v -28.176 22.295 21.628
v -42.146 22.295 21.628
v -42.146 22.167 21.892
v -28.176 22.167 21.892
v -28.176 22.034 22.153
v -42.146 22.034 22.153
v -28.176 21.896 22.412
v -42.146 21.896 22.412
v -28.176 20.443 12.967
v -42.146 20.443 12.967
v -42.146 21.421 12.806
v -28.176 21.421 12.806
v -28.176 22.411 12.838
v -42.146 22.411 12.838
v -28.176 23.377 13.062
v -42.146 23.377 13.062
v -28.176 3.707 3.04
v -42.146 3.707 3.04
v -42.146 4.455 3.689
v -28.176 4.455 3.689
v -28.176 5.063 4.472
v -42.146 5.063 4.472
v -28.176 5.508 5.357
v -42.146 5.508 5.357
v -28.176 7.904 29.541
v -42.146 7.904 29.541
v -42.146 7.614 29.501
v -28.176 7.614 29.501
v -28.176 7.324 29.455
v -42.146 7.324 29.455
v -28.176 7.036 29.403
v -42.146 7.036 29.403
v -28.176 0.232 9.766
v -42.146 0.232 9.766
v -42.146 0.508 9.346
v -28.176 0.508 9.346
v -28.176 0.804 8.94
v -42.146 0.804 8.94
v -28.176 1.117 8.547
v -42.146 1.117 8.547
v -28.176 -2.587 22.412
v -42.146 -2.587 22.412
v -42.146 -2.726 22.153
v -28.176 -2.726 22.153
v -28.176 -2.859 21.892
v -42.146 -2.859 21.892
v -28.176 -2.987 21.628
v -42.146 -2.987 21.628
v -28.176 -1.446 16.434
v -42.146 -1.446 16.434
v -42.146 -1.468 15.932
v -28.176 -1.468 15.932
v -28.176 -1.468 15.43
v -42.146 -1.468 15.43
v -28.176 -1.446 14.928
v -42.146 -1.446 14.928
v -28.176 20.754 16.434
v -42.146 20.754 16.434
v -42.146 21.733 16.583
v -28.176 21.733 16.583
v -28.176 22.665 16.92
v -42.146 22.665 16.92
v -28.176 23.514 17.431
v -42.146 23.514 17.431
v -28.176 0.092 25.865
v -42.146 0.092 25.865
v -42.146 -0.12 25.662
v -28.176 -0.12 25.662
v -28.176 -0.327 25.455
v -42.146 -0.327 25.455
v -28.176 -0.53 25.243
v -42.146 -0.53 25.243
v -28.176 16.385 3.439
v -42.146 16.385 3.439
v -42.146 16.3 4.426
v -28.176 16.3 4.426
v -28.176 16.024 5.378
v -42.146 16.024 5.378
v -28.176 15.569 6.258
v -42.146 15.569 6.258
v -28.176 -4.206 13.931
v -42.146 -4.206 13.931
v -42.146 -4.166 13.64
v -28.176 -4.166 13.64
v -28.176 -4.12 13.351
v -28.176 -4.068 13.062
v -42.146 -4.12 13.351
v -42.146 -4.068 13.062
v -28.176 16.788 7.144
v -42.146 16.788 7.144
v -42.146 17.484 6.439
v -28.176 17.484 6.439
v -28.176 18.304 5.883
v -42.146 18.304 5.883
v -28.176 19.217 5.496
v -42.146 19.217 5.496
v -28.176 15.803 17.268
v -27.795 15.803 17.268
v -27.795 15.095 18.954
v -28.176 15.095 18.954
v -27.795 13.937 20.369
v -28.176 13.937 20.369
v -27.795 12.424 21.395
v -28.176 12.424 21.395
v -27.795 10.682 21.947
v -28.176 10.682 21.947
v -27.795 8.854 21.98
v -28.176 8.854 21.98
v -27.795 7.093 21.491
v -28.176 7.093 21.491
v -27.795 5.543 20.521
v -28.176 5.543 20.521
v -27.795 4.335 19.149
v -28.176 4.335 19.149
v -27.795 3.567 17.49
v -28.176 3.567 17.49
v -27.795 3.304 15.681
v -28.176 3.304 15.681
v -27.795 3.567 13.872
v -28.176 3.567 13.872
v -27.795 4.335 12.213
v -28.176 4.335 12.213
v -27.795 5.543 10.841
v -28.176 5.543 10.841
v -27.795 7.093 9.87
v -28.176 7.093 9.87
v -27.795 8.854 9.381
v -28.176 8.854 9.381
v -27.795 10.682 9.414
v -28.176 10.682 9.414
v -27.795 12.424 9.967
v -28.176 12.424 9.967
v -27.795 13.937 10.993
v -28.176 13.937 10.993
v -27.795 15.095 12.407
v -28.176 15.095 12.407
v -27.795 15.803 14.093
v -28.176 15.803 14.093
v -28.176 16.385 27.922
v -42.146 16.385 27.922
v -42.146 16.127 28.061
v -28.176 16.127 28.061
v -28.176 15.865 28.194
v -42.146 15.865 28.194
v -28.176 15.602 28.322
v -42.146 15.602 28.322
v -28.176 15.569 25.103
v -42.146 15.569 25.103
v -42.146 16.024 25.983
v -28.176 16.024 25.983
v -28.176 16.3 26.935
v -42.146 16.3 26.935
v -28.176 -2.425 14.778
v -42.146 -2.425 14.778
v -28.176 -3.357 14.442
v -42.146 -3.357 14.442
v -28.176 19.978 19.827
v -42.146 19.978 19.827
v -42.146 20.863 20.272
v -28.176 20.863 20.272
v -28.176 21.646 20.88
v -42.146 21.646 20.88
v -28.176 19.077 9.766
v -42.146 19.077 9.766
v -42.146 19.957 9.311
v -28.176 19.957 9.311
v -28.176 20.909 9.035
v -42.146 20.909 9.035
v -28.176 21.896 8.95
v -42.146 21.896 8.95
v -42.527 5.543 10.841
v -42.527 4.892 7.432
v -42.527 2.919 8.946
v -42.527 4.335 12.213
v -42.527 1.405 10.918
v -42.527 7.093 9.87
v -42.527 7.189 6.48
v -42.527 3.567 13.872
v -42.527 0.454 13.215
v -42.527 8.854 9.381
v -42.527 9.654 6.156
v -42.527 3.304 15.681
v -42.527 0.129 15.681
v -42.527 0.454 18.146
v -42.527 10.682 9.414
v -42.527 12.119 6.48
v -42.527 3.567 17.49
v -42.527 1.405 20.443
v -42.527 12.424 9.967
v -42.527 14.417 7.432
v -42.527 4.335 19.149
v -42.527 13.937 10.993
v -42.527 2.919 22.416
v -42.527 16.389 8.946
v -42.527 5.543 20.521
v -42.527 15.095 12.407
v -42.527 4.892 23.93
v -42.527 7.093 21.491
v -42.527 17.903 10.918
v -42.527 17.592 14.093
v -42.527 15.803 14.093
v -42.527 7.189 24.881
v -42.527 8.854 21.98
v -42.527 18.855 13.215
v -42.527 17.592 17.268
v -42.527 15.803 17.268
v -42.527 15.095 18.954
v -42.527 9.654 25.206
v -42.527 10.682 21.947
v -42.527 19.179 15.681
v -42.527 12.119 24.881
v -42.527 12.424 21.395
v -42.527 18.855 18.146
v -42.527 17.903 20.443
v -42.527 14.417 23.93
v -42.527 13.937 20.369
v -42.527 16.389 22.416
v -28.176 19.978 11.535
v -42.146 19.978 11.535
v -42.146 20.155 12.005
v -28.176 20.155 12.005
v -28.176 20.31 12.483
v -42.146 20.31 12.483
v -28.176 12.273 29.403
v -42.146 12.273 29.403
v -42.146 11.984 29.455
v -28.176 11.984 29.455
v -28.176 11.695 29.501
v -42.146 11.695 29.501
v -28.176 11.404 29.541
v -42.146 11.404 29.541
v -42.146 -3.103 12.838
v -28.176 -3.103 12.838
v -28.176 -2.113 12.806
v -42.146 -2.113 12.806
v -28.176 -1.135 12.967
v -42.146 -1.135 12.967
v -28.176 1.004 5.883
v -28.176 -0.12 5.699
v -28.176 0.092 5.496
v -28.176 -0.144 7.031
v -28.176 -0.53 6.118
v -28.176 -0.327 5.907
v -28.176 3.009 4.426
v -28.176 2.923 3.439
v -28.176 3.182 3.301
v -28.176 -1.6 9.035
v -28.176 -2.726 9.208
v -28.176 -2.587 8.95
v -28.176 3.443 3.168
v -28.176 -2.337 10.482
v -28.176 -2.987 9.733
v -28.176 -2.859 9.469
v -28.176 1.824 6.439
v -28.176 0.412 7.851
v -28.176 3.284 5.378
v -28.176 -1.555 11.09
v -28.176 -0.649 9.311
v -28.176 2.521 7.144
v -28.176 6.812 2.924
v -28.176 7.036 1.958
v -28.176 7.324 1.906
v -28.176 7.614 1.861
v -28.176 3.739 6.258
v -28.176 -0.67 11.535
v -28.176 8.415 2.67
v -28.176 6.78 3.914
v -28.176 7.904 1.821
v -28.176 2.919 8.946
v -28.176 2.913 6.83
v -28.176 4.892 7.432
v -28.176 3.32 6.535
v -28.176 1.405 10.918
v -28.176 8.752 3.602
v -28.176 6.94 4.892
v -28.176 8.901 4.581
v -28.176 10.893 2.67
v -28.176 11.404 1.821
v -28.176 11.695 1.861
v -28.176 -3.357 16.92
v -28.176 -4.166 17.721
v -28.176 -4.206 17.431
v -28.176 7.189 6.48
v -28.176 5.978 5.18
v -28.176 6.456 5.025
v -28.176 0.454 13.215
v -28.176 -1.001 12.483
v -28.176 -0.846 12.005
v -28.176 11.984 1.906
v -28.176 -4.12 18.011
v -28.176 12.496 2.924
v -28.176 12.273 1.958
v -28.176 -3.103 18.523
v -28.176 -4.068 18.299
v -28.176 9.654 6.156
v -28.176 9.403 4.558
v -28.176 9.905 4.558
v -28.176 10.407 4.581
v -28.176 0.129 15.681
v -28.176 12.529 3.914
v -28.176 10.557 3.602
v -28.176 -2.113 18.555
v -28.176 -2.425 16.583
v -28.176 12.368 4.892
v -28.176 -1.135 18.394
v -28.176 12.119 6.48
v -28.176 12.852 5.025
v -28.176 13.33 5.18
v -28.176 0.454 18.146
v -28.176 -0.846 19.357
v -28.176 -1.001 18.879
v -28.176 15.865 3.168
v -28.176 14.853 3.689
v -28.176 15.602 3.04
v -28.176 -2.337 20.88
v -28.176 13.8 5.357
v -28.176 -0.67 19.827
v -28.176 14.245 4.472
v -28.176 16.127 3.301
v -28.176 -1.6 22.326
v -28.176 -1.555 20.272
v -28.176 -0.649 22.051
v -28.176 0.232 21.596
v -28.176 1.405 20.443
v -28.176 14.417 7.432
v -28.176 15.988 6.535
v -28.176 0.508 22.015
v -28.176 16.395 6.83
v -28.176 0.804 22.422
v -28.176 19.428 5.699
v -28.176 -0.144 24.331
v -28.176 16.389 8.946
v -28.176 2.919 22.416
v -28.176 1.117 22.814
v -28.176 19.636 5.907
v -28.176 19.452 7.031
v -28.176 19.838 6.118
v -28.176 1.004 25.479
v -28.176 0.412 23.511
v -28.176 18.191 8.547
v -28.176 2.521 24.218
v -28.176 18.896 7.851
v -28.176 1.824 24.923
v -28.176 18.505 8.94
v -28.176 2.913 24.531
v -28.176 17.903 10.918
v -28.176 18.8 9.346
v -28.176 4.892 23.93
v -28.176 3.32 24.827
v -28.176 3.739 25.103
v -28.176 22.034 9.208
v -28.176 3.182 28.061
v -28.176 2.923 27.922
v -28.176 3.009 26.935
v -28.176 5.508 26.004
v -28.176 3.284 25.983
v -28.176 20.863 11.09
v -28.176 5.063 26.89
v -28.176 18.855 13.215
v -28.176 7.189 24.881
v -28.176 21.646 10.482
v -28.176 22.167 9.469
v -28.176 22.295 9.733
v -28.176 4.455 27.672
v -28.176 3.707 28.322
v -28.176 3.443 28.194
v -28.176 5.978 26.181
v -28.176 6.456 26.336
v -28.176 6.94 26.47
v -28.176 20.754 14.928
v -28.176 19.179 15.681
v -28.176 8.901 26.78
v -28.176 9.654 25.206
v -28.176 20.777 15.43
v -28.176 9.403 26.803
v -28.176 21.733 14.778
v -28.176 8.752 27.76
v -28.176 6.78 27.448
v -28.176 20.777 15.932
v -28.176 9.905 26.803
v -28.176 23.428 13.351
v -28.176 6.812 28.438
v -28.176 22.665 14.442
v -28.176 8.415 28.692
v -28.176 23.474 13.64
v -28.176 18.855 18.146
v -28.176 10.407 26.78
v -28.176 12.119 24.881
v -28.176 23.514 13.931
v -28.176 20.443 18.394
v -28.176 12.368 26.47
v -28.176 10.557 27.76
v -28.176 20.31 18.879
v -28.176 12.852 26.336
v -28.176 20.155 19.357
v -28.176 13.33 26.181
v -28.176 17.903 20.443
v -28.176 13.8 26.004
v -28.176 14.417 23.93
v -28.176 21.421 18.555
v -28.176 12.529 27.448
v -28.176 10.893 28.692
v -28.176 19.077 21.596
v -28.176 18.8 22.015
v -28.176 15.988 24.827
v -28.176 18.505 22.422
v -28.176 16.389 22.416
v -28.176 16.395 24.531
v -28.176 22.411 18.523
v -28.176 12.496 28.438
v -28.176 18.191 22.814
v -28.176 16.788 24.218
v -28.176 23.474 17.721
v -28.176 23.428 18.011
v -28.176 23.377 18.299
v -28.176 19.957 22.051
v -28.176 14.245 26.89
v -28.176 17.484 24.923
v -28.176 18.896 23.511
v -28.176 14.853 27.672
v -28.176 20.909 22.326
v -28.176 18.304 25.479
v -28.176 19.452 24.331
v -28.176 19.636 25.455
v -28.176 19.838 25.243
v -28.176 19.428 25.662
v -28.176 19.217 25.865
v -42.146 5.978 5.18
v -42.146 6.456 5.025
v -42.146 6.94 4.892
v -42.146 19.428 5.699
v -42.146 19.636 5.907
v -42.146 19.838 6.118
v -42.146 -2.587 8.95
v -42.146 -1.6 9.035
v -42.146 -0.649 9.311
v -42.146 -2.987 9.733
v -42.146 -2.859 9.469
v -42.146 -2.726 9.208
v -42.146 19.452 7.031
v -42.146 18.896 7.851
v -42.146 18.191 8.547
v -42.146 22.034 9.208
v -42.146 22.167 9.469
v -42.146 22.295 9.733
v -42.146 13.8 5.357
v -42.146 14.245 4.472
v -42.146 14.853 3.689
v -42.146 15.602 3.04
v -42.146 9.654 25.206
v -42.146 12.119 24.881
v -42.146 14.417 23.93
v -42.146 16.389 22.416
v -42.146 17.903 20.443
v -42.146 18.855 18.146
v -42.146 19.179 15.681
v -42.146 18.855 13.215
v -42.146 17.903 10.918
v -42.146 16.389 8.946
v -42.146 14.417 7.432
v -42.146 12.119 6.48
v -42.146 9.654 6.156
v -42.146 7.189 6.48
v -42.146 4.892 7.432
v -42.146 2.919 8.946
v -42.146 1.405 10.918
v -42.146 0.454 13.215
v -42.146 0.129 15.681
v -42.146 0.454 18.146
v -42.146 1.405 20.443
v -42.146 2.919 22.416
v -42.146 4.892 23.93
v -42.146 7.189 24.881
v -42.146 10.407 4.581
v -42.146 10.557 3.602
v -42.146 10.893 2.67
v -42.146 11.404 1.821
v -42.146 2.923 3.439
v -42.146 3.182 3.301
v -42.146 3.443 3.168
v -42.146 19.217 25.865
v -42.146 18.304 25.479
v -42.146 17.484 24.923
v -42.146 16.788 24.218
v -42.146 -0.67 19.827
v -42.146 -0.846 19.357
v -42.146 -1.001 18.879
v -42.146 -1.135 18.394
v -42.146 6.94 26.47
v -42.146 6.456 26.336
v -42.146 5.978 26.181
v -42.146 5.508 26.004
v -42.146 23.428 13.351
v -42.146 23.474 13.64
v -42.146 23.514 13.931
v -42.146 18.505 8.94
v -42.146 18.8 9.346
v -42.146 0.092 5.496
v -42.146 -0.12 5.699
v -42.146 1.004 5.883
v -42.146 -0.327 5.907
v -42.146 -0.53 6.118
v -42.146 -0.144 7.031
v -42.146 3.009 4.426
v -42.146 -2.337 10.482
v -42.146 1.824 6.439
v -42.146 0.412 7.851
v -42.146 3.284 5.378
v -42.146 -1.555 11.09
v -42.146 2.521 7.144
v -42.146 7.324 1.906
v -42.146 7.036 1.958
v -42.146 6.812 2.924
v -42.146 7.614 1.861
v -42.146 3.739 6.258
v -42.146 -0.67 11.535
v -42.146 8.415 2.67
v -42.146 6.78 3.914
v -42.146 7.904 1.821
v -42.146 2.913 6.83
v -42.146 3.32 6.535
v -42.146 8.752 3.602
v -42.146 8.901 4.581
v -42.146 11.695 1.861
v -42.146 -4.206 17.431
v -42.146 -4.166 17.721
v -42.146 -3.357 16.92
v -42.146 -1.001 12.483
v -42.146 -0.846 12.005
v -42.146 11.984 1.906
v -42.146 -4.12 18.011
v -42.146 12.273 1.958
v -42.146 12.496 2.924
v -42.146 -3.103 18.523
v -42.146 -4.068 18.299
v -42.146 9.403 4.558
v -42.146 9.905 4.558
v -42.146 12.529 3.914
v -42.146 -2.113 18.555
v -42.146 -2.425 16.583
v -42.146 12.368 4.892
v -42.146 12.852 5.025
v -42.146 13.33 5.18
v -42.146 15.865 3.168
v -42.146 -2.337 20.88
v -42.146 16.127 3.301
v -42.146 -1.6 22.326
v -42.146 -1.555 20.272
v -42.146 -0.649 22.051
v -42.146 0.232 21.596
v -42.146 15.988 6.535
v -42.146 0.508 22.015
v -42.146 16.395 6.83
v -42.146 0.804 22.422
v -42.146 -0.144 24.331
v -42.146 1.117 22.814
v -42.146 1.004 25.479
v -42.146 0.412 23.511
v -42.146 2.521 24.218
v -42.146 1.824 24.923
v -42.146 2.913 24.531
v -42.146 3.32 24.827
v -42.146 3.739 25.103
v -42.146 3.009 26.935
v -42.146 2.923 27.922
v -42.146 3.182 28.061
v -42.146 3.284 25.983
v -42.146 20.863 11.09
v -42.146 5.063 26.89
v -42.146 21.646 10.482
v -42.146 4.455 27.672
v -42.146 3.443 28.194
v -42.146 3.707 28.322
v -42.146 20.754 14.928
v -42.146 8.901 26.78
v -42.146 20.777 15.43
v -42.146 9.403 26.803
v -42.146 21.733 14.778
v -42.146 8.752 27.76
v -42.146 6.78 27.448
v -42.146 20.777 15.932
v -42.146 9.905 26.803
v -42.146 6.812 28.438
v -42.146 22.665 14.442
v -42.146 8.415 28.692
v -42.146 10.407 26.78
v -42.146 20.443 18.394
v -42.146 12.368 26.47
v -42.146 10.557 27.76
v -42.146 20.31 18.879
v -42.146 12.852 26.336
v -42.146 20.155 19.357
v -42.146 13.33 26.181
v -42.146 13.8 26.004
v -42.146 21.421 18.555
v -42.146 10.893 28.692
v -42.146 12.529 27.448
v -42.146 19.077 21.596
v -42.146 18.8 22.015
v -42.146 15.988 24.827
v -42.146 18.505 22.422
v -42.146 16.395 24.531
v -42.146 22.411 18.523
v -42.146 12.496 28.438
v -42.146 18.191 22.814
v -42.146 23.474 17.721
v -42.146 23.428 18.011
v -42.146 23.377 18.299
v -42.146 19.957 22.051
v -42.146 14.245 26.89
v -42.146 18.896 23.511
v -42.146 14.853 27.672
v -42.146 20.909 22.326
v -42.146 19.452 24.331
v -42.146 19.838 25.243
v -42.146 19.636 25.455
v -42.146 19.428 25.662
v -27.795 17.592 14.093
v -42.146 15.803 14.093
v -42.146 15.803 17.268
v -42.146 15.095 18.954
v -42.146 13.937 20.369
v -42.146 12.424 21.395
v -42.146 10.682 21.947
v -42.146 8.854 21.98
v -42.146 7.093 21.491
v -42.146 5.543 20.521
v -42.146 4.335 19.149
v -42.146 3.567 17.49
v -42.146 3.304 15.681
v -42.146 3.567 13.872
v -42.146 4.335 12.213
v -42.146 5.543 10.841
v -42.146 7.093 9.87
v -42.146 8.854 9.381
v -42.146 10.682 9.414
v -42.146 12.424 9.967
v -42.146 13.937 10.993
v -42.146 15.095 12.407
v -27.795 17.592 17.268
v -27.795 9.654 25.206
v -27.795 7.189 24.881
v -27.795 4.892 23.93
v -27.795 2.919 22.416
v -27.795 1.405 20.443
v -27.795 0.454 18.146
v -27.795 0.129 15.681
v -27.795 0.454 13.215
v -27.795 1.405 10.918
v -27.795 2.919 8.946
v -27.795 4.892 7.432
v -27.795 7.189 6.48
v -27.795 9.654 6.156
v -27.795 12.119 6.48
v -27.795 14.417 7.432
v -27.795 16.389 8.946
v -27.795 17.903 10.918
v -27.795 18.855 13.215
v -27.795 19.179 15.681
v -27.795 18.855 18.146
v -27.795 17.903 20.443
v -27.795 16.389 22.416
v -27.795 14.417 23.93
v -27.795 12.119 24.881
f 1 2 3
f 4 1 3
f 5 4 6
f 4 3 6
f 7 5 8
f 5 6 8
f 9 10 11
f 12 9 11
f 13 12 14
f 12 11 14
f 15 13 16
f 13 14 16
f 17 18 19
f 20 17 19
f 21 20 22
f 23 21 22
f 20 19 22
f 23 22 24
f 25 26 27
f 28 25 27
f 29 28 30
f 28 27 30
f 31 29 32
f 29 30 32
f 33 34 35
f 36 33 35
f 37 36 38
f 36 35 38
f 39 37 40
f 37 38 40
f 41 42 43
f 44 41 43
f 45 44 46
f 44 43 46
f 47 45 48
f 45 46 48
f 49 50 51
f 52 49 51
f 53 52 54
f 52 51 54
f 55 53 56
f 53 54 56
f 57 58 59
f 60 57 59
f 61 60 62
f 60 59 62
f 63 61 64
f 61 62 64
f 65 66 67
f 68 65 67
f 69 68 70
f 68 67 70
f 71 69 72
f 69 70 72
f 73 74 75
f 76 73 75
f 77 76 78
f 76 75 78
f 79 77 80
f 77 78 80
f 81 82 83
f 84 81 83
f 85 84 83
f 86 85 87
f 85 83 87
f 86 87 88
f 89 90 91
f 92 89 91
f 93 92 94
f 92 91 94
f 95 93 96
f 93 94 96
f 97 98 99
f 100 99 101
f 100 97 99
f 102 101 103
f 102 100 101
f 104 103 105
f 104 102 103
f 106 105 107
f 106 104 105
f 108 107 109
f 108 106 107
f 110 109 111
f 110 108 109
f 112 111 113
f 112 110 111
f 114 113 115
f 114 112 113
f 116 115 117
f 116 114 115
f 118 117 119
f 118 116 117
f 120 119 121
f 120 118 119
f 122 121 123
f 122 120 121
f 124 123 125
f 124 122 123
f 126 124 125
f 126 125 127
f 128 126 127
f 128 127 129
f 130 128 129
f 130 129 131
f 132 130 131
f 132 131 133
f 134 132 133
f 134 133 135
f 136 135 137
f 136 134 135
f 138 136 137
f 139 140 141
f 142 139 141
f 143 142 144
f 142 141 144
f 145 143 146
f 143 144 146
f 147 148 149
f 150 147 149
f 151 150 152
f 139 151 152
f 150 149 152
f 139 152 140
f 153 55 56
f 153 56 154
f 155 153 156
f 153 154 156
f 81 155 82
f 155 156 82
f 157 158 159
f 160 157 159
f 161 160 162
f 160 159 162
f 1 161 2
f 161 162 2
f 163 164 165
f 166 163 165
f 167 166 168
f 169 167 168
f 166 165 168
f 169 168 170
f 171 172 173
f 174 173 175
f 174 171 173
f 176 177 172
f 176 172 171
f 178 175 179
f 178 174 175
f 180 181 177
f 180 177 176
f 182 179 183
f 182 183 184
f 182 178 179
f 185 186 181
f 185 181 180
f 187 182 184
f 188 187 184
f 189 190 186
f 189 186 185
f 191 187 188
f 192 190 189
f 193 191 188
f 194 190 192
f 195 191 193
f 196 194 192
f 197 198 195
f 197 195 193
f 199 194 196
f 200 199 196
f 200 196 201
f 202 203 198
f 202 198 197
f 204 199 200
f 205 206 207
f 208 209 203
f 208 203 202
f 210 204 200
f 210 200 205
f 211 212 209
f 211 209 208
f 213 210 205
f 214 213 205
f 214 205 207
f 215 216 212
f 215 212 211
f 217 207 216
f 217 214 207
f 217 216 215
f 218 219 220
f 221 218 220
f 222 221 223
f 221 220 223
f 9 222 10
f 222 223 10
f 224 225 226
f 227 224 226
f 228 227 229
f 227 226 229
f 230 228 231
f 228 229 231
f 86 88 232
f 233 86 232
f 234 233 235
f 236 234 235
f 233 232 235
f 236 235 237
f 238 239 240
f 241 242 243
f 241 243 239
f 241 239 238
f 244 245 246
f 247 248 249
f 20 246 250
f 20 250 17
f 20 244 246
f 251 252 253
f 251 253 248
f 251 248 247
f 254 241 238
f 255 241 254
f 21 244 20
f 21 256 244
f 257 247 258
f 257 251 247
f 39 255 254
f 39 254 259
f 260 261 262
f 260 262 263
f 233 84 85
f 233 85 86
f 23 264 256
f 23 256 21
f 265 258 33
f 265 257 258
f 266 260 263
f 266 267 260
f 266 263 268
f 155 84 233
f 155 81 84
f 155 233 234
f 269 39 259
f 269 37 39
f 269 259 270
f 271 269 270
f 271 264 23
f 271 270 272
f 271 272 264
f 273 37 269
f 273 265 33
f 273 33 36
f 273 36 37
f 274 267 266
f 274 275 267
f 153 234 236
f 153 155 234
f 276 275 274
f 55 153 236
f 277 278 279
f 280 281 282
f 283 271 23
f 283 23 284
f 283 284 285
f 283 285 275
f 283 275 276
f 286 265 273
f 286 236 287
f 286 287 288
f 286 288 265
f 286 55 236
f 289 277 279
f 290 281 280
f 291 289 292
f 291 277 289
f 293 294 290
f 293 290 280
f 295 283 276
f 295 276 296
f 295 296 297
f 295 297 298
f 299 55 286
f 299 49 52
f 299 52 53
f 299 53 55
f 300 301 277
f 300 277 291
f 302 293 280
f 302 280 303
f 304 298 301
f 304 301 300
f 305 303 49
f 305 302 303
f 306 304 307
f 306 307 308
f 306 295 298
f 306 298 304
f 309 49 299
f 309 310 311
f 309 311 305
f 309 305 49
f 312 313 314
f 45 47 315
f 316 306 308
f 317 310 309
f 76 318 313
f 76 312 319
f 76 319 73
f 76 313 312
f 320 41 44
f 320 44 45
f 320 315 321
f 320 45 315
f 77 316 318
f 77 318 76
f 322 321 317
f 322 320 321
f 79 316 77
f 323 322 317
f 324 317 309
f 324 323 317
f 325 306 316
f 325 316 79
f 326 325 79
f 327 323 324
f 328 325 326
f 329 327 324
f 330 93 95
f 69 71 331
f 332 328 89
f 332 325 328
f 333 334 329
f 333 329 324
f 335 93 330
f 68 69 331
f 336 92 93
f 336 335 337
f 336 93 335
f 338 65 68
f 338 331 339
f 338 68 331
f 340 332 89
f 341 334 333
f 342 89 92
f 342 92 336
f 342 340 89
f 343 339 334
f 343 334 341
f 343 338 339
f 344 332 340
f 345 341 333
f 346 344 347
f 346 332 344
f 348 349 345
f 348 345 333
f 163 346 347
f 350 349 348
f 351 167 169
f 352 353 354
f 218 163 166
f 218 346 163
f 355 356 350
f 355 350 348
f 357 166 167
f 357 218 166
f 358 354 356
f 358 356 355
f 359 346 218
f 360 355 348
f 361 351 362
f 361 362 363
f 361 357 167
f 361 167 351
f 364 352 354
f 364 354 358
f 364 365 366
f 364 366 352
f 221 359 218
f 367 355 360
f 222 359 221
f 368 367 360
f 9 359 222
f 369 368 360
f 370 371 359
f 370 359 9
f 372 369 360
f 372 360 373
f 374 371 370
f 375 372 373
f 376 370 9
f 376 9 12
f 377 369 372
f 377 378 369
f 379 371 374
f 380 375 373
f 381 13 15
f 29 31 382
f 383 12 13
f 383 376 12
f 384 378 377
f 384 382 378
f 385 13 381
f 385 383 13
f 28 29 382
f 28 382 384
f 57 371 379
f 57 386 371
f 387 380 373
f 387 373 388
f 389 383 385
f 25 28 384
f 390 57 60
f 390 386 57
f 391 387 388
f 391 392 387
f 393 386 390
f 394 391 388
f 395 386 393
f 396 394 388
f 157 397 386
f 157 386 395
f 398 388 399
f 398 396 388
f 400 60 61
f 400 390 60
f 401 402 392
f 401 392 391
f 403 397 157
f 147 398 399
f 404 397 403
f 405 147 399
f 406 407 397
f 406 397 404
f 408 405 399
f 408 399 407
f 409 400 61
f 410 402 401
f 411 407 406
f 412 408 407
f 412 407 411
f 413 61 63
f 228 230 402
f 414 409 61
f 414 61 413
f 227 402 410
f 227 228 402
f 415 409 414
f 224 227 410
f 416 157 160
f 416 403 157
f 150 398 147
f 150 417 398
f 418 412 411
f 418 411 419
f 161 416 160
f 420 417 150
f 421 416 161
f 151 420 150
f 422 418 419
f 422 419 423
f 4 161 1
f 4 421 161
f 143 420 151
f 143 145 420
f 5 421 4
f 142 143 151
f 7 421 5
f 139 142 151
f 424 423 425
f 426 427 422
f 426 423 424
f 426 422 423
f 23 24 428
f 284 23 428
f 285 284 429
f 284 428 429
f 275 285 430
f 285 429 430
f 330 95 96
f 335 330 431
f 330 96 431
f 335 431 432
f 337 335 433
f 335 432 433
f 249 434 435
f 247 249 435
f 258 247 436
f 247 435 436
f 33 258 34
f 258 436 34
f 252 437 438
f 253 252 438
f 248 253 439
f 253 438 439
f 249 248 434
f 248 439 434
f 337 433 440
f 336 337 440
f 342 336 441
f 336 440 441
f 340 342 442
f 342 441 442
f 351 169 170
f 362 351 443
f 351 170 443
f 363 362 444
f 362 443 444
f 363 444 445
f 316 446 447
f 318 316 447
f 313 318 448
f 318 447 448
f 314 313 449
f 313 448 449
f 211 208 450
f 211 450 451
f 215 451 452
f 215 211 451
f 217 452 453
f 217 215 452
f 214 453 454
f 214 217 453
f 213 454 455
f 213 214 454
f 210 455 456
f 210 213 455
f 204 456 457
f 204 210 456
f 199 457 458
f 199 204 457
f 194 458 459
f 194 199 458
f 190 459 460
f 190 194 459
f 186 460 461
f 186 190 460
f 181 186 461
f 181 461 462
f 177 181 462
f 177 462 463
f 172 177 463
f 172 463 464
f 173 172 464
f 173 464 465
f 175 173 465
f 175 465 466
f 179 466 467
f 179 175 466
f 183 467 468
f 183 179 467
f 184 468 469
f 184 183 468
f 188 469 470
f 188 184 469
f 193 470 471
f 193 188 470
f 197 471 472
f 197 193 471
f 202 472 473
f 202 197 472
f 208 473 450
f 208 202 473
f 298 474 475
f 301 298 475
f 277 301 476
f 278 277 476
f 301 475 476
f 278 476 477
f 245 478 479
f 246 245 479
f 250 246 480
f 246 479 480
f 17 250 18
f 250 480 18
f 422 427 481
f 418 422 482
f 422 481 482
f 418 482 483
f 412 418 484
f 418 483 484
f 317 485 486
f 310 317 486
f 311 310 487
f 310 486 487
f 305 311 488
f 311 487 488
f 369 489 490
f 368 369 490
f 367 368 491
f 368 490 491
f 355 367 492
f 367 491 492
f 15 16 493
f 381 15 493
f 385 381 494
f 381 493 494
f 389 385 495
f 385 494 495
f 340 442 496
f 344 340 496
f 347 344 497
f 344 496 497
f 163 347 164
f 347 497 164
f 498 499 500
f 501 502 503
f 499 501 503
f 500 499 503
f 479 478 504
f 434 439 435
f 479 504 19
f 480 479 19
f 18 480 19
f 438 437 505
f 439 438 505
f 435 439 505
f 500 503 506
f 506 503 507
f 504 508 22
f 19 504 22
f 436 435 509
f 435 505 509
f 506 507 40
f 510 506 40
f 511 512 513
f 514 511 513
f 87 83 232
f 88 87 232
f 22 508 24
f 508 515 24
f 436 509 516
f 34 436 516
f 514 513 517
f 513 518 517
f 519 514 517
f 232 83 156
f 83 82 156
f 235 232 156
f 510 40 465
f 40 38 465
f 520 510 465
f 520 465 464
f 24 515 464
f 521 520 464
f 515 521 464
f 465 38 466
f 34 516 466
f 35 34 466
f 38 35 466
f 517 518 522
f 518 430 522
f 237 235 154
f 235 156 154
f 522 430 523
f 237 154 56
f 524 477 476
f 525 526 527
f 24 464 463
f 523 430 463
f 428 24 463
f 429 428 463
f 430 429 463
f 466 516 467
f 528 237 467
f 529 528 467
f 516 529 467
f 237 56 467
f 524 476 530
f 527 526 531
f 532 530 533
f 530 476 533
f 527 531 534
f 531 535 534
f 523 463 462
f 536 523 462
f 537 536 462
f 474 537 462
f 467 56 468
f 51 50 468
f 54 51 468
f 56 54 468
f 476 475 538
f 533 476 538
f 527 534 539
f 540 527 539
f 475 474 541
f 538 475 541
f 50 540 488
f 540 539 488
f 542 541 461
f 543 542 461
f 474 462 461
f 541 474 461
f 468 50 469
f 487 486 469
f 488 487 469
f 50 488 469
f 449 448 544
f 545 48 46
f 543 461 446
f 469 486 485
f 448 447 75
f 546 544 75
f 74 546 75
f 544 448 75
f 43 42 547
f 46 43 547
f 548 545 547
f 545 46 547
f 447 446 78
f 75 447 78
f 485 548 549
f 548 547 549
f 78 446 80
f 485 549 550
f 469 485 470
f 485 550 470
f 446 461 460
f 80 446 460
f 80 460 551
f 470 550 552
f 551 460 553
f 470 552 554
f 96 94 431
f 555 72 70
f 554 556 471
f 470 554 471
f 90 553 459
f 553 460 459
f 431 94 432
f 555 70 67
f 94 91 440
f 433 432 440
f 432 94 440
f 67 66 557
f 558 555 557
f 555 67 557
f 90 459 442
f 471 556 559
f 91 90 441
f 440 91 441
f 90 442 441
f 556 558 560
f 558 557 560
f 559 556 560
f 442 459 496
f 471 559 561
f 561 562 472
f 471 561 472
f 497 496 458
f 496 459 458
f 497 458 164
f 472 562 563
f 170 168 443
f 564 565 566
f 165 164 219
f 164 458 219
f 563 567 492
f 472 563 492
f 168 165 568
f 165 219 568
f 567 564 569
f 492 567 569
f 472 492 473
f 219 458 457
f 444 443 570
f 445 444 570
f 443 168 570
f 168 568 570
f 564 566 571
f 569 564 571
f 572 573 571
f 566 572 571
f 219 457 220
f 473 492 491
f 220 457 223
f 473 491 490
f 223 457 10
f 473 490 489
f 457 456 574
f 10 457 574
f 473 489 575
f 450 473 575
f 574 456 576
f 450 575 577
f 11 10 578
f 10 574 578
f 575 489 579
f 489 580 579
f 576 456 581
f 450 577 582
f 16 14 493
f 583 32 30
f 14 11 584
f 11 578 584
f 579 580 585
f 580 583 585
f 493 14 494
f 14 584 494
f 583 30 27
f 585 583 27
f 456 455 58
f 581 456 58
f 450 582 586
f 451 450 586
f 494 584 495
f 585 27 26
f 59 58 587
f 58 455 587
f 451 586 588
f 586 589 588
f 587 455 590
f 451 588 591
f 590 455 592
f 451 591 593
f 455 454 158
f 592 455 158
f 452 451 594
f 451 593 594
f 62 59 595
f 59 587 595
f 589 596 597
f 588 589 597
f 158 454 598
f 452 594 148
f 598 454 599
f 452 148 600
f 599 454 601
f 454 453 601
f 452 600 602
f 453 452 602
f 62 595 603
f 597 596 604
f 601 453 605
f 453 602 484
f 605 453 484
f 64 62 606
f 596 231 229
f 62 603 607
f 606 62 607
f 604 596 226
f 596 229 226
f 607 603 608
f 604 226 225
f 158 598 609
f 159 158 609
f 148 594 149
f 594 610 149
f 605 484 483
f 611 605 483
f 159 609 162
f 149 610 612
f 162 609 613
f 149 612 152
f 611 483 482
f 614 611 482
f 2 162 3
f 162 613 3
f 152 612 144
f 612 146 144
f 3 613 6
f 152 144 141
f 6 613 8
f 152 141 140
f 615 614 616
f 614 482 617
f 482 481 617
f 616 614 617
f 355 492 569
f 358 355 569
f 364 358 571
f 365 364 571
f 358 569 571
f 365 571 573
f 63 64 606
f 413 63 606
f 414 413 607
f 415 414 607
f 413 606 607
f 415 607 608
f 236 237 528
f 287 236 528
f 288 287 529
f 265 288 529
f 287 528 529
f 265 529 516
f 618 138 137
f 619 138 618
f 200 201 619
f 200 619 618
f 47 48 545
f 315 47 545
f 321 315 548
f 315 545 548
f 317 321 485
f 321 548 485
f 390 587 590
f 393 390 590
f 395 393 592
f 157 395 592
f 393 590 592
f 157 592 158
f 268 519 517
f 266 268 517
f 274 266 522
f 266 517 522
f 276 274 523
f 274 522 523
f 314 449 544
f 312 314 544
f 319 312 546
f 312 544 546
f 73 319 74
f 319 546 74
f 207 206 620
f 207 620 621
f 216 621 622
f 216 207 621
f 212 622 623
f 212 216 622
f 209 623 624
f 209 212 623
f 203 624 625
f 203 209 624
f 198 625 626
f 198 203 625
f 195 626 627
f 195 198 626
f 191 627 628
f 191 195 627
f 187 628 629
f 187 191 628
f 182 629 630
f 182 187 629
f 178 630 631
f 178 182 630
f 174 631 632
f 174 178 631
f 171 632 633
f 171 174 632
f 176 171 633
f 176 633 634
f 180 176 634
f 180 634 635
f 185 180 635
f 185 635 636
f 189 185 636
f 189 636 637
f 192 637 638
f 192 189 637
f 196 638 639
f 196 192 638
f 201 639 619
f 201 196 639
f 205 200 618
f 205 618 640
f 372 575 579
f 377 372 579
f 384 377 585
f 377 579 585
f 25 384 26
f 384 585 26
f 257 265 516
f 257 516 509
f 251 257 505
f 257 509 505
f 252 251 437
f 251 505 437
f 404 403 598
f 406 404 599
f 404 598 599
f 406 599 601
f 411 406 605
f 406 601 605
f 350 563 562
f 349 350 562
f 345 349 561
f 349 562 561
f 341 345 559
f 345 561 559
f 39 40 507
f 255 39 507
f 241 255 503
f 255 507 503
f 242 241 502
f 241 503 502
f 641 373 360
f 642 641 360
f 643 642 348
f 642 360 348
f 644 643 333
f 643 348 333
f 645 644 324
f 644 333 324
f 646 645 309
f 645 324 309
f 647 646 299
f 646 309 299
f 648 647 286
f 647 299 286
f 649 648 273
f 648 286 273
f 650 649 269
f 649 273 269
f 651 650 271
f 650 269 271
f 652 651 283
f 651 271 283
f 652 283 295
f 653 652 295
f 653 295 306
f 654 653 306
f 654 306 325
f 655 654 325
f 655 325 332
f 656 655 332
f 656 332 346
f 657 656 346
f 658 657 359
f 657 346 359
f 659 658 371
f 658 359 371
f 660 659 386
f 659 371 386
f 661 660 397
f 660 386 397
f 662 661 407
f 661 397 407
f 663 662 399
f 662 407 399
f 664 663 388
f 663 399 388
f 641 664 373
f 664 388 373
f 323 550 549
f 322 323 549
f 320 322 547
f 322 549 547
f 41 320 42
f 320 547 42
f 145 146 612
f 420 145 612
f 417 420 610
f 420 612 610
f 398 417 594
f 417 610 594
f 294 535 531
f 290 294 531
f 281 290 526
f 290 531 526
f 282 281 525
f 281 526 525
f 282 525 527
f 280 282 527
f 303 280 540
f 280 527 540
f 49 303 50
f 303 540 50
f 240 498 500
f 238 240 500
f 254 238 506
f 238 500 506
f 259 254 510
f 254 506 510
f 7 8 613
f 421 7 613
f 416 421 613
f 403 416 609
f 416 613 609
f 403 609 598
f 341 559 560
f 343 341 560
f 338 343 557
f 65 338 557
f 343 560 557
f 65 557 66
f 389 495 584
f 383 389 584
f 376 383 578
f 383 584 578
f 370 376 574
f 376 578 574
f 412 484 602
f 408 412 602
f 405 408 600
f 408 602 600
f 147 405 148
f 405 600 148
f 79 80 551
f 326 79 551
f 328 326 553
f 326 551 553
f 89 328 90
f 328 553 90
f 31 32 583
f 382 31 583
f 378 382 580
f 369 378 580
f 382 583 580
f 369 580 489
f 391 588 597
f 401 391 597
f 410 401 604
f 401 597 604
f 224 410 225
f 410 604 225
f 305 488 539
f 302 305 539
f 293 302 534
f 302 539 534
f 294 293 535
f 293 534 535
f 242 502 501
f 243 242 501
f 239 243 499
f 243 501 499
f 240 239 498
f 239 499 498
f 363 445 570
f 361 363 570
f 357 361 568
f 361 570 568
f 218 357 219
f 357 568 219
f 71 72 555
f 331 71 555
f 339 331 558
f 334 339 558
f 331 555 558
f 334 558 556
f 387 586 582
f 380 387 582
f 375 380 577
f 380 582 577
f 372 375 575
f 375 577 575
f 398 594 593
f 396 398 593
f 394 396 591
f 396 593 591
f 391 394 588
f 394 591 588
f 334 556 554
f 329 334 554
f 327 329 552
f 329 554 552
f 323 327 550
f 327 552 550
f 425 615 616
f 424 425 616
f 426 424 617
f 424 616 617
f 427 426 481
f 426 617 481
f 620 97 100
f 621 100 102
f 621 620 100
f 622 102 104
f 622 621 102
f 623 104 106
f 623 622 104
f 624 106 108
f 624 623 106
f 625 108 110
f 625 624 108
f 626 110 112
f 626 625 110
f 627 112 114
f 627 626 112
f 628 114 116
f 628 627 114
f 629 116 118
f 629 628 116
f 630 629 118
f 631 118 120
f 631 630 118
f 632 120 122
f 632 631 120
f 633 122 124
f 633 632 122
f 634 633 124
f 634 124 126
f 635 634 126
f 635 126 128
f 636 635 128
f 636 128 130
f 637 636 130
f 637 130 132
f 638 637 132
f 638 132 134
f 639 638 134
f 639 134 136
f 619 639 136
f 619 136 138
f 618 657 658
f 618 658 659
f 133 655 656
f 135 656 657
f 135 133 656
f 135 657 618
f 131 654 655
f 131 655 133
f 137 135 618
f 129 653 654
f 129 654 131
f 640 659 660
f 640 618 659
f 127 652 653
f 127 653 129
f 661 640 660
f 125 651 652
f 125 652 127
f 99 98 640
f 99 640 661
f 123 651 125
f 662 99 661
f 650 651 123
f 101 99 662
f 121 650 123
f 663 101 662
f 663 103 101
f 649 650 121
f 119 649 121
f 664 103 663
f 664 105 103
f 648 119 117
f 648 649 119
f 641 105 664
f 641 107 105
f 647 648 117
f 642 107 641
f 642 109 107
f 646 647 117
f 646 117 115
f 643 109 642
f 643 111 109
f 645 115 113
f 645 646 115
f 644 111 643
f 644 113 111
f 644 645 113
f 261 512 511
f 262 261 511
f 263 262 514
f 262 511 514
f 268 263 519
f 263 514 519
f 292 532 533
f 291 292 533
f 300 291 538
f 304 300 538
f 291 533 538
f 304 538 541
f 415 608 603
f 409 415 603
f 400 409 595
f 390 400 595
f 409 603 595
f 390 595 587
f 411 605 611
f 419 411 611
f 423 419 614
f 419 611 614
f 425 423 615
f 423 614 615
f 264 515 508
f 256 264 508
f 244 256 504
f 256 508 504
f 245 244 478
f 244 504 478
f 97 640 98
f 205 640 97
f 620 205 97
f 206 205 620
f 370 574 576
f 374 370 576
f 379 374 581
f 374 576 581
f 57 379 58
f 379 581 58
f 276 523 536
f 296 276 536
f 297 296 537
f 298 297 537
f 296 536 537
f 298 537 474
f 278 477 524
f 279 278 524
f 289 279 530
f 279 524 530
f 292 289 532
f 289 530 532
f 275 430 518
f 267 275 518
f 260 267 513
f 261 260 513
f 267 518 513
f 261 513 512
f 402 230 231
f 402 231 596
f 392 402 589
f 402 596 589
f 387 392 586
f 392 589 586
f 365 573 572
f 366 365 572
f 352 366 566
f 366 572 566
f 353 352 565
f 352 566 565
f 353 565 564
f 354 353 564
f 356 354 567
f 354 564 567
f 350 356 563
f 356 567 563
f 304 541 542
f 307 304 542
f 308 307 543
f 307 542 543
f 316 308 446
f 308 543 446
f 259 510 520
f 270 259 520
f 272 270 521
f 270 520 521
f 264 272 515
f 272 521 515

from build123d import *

# Parameters (mm, degrees)
SPUR_START             = -42.145535126
SPUR_GEAR_AI_OUTLINE_R = 6.35
SPUR_GEAR_AI_DEPTH     = 13.97
SKETCH1_W              = 3.175
SKETCH1_H              = 3.175
CUT_EXTRUDE1_DEPTH     = 41.258239372
SKETCH2_R              = 9.525
BOSS_EXTRUDE1_DEPTH    = 0.381
BOSS_EXTRUDE2_START    = 0.381
SKETCH3_R              = 9.525
BOSS_EXTRUDE2_DEPTH    = 0.381


# Read off the part's stored shape, not the designer's step: spur gear_ai
with BuildPart() as part:
    # spur gear_ai outline → spur gear_ai (new body)
    with BuildSketch(Plane.YZ.offset(SPUR_START)):
        with BuildLine():
            ThreePointArc((21.89573329, 8.949900066), (22.10150024, 9.338497576), (22.294935451, 9.733378421))
            ThreePointArc((22.294935451, 9.733378421), (21.269289936, 10.804918767), (19.977842952, 11.534516))
            ThreePointArc((19.977842952, 11.534516), (20.234833052, 12.242868992), (20.443283136, 12.966993591))
            ThreePointArc((20.443283136, 12.966993591), (21.916932187, 12.79815666), (23.376532451, 13.062191702))
            ThreePointArc((23.376532451, 13.062191702), (23.452145215, 13.495355381), (23.514088141, 13.93068415))
            ThreePointArc((23.514088141, 13.93068415), (22.207517114, 14.632837684), (20.7538201, 14.927646821))
            ThreePointArc((20.7538201, 14.927646821), (20.779339097, 15.680744858), (20.7538201, 16.433842895))
            ThreePointArc((20.7538201, 16.433842895), (22.207517114, 16.728652032), (23.514088141, 17.430805566))
            ThreePointArc((23.514088141, 17.430805566), (23.452145215, 17.866134334), (23.376532451, 18.299298013))
            ThreePointArc((23.376532451, 18.299298013), (21.916932187, 18.563333056), (20.443283136, 18.394496125))
            ThreePointArc((20.443283136, 18.394496125), (20.234833052, 19.118620724), (19.977842952, 19.826973715))
            ThreePointArc((19.977842952, 19.826973715), (21.269289936, 20.556570948), (22.294935451, 21.628111294))
            ThreePointArc((22.294935451, 21.628111294), (22.10150024, 22.022992139), (21.89573329, 22.41158965))
            ThreePointArc((21.89573329, 22.41158965), (20.425979632, 22.21166061), (19.07662958, 21.595704547))
            ThreePointArc((19.07662958, 21.595704547), (18.654614962, 22.219973346), (18.191309741, 22.814242767))
            ThreePointArc((18.191309741, 22.814242767), (19.194090867, 23.907210035), (19.83841354, 25.243247358))
            ThreePointArc((19.83841354, 25.243247358), (19.53242083, 25.559026591), (19.216641597, 25.865019301))
            ThreePointArc((19.216641597, 25.865019301), (17.880604274, 25.220696628), (16.787637006, 24.217915502))
            ThreePointArc((16.787637006, 24.217915502), (16.193367585, 24.681220723), (15.569098786, 25.103235341))
            ThreePointArc((15.569098786, 25.103235341), (16.185054849, 26.452585393), (16.384983889, 27.922339051))
            ThreePointArc((16.384983889, 27.922339051), (15.996386378, 28.128106001), (15.601505533, 28.321541212))
            ThreePointArc((15.601505533, 28.321541212), (14.529965187, 27.295895697), (13.800367954, 26.004448713))
            ThreePointArc((13.800367954, 26.004448713), (13.092014963, 26.261438813), (12.367890364, 26.469888897))
            ThreePointArc((12.367890364, 26.469888897), (12.536727295, 27.943537948), (12.272692252, 29.403138212))
            ThreePointArc((12.272692252, 29.403138212), (11.839528573, 29.478750976), (11.404199805, 29.540693902))
            ThreePointArc((11.404199805, 29.540693902), (10.702046271, 28.234122875), (10.407237134, 26.780425861))
            ThreePointArc((10.407237134, 26.780425861), (9.654139097, 26.805944858), (8.90104106, 26.780425861))
            ThreePointArc((8.90104106, 26.780425861), (8.606231923, 28.234122875), (7.904078389, 29.540693902))
            ThreePointArc((7.904078389, 29.540693902), (7.46874962, 29.478750976), (7.035585941, 29.403138212))
            ThreePointArc((7.035585941, 29.403138212), (6.771550899, 27.943537948), (6.94038783, 26.469888897))
            ThreePointArc((6.94038783, 26.469888897), (6.216263231, 26.261438813), (5.507910239, 26.004448713))
            ThreePointArc((5.507910239, 26.004448713), (4.778313006, 27.295895697), (3.70677266, 28.321541212))
            ThreePointArc((3.70677266, 28.321541212), (3.311891815, 28.128106001), (2.923294305, 27.922339051))
            ThreePointArc((2.923294305, 27.922339051), (3.123223344, 26.452585393), (3.739179408, 25.103235341))
            ThreePointArc((3.739179408, 25.103235341), (3.114910608, 24.681220723), (2.520641187, 24.217915502))
            ThreePointArc((2.520641187, 24.217915502), (1.427673919, 25.220696628), (0.091636597, 25.865019301))
            ThreePointArc((0.091636597, 25.865019301), (-0.224142637, 25.559026591), (-0.530135347, 25.243247358))
            ThreePointArc((-0.530135347, 25.243247358), (0.114187326, 23.907210035), (1.116968452, 22.814242767))
            ThreePointArc((1.116968452, 22.814242767), (0.653663231, 22.219973346), (0.231648613, 21.595704547))
            ThreePointArc((0.231648613, 21.595704547), (-1.117701439, 22.21166061), (-2.587455096, 22.41158965))
            ThreePointArc((-2.587455096, 22.41158965), (-2.793222046, 22.022992139), (-2.986657258, 21.628111294))
            ThreePointArc((-2.986657258, 21.628111294), (-1.961011743, 20.556570948), (-0.669564759, 19.826973715))
            ThreePointArc((-0.669564759, 19.826973715), (-0.926554858, 19.118620723), (-1.135004943, 18.394496125))
            ThreePointArc((-1.135004943, 18.394496125), (-2.608653994, 18.563333056), (-4.068254258, 18.299298013))
            ThreePointArc((-4.068254258, 18.299298013), (-4.143867021, 17.866134334), (-4.205809948, 17.430805566))
            ThreePointArc((-4.205809948, 17.430805566), (-2.899238921, 16.728652032), (-1.445541907, 16.433842895))
            ThreePointArc((-1.445541907, 16.433842895), (-1.471060903, 15.680744858), (-1.445541907, 14.927646821))
            ThreePointArc((-1.445541907, 14.927646821), (-2.899238921, 14.632837684), (-4.205809948, 13.93068415))
            ThreePointArc((-4.205809948, 13.93068415), (-4.143867021, 13.495355381), (-4.068254258, 13.062191702))
            ThreePointArc((-4.068254258, 13.062191702), (-2.608653994, 12.79815666), (-1.135004943, 12.966993591))
            ThreePointArc((-1.135004943, 12.966993591), (-0.926554858, 12.242868992), (-0.669564759, 11.534516))
            ThreePointArc((-0.669564759, 11.534516), (-1.961011743, 10.804918767), (-2.986657258, 9.733378421))
            ThreePointArc((-2.986657258, 9.733378421), (-2.793222046, 9.338497576), (-2.587455096, 8.949900066))
            ThreePointArc((-2.587455096, 8.949900066), (-1.117701439, 9.149829105), (0.231648613, 9.765785169))
            ThreePointArc((0.231648613, 9.765785169), (0.653663231, 9.141516369), (1.116968452, 8.547246948))
            ThreePointArc((1.116968452, 8.547246948), (0.114187326, 7.45427968), (-0.530135347, 6.118242358))
            ThreePointArc((-0.530135347, 6.118242358), (-0.224142637, 5.802463124), (0.091636597, 5.496470414))
            ThreePointArc((0.091636597, 5.496470414), (1.427673919, 6.140793087), (2.520641187, 7.143574213))
            ThreePointArc((2.520641187, 7.143574213), (3.114910608, 6.680268992), (3.739179408, 6.258254374))
            ThreePointArc((3.739179408, 6.258254374), (3.123223344, 4.908904322), (2.923294305, 3.439150665))
            ThreePointArc((2.923294305, 3.439150665), (3.311891815, 3.233383715), (3.70677266, 3.039948503))
            ThreePointArc((3.70677266, 3.039948503), (4.778313006, 4.065594018), (5.507910239, 5.357041002))
            ThreePointArc((5.507910239, 5.357041002), (6.216263231, 5.100050903), (6.94038783, 4.891600818))
            ThreePointArc((6.94038783, 4.891600818), (6.771550899, 3.417951767), (7.035585941, 1.958351503))
            ThreePointArc((7.035585941, 1.958351503), (7.46874962, 1.882738739), (7.904078389, 1.820795813))
            ThreePointArc((7.904078389, 1.820795813), (8.606231923, 3.12736684), (8.90104106, 4.581063854))
            ThreePointArc((8.90104106, 4.581063854), (9.654139097, 4.555544858), (10.407237134, 4.581063854))
            ThreePointArc((10.407237134, 4.581063854), (10.702046271, 3.12736684), (11.404199805, 1.820795813))
            ThreePointArc((11.404199805, 1.820795813), (11.839528573, 1.882738739), (12.272692252, 1.958351503))
            ThreePointArc((12.272692252, 1.958351503), (12.536727295, 3.417951767), (12.367890364, 4.891600818))
            ThreePointArc((12.367890364, 4.891600818), (13.092014962, 5.100050903), (13.800367954, 5.357041002))
            ThreePointArc((13.800367954, 5.357041002), (14.529965187, 4.065594018), (15.601505533, 3.039948503))
            ThreePointArc((15.601505533, 3.039948503), (15.996386378, 3.233383715), (16.384983889, 3.439150665))
            ThreePointArc((16.384983889, 3.439150665), (16.185054849, 4.908904322), (15.569098786, 6.258254374))
            ThreePointArc((15.569098786, 6.258254374), (16.193367585, 6.680268992), (16.787637006, 7.143574213))
            ThreePointArc((16.787637006, 7.143574213), (17.880604274, 6.140793087), (19.216641597, 5.496470414))
            ThreePointArc((19.216641597, 5.496470414), (19.53242083, 5.802463124), (19.83841354, 6.118242358))
            ThreePointArc((19.83841354, 6.118242358), (19.194090867, 7.45427968), (18.191309741, 8.547246948))
            ThreePointArc((18.191309741, 8.547246948), (18.654614962, 9.141516369), (19.07662958, 9.765785169))
            ThreePointArc((19.07662958, 9.765785169), (20.425979632, 9.149829105), (21.89573329, 8.949900066))
        make_face()
        with Locations((9.654139097, 15.680744858)):
            Circle(SPUR_GEAR_AI_OUTLINE_R, mode=Mode.SUBTRACT)
    extrude(amount=SPUR_GEAR_AI_DEPTH)

    # Sketch1 → Cut-Extrude1 (cut, through all)
    with BuildSketch(Plane(origin=(-28.175535126, 0, 0), x_dir=(0, 0, -1), z_dir=(1, 0, 0))):
        with Locations((-15.680744858, 16.004139097)):
            Rectangle(SKETCH1_W, SKETCH1_H)
    extrude(amount=-CUT_EXTRUDE1_DEPTH, mode=Mode.SUBTRACT)

    # Sketch2 → Boss-Extrude1 (add)
    with BuildSketch(Plane(origin=(-28.175535126, 0, 0), x_dir=(0, 0, -1), z_dir=(1, 0, 0))):
        with Locations(Location((-15.680744858, 9.654139097, 0), (0, 0, 180))):
            Circle(SKETCH2_R)
        with BuildLine():
            Line((-14.093244858, 17.591639097), (-17.268244858, 17.591639097))
            Line((-17.268244858, 17.591639097), (-17.268244858, 15.802500159))
            ThreePointArc((-17.268244858, 15.802500159), (-15.680744858, 3.304139097), (-14.093244858, 15.802500159))
            Line((-14.093244858, 15.802500159), (-14.093244858, 17.591639097))
        make_face(mode=Mode.SUBTRACT)
    extrude(amount=BOSS_EXTRUDE1_DEPTH)

    # Sketch3 → Boss-Extrude2 (add)
    with BuildSketch(Plane.ZY.offset(42.145535126).offset(BOSS_EXTRUDE2_START)):
        with Locations((15.680744858, 9.654139097)):
            Circle(SKETCH3_R)
        with BuildLine():
            Line((14.093244858, 15.802500159), (14.093244858, 17.591639097))
            Line((14.093244858, 17.591639097), (17.268244858, 17.591639097))
            Line((17.268244858, 17.591639097), (17.268244858, 15.802500159))
            ThreePointArc((17.268244858, 15.802500159), (15.680744858, 3.304139097), (14.093244858, 15.802500159))
        make_face(mode=Mode.SUBTRACT)
    extrude(amount=-BOSS_EXTRUDE2_DEPTH)


solid = part.part
